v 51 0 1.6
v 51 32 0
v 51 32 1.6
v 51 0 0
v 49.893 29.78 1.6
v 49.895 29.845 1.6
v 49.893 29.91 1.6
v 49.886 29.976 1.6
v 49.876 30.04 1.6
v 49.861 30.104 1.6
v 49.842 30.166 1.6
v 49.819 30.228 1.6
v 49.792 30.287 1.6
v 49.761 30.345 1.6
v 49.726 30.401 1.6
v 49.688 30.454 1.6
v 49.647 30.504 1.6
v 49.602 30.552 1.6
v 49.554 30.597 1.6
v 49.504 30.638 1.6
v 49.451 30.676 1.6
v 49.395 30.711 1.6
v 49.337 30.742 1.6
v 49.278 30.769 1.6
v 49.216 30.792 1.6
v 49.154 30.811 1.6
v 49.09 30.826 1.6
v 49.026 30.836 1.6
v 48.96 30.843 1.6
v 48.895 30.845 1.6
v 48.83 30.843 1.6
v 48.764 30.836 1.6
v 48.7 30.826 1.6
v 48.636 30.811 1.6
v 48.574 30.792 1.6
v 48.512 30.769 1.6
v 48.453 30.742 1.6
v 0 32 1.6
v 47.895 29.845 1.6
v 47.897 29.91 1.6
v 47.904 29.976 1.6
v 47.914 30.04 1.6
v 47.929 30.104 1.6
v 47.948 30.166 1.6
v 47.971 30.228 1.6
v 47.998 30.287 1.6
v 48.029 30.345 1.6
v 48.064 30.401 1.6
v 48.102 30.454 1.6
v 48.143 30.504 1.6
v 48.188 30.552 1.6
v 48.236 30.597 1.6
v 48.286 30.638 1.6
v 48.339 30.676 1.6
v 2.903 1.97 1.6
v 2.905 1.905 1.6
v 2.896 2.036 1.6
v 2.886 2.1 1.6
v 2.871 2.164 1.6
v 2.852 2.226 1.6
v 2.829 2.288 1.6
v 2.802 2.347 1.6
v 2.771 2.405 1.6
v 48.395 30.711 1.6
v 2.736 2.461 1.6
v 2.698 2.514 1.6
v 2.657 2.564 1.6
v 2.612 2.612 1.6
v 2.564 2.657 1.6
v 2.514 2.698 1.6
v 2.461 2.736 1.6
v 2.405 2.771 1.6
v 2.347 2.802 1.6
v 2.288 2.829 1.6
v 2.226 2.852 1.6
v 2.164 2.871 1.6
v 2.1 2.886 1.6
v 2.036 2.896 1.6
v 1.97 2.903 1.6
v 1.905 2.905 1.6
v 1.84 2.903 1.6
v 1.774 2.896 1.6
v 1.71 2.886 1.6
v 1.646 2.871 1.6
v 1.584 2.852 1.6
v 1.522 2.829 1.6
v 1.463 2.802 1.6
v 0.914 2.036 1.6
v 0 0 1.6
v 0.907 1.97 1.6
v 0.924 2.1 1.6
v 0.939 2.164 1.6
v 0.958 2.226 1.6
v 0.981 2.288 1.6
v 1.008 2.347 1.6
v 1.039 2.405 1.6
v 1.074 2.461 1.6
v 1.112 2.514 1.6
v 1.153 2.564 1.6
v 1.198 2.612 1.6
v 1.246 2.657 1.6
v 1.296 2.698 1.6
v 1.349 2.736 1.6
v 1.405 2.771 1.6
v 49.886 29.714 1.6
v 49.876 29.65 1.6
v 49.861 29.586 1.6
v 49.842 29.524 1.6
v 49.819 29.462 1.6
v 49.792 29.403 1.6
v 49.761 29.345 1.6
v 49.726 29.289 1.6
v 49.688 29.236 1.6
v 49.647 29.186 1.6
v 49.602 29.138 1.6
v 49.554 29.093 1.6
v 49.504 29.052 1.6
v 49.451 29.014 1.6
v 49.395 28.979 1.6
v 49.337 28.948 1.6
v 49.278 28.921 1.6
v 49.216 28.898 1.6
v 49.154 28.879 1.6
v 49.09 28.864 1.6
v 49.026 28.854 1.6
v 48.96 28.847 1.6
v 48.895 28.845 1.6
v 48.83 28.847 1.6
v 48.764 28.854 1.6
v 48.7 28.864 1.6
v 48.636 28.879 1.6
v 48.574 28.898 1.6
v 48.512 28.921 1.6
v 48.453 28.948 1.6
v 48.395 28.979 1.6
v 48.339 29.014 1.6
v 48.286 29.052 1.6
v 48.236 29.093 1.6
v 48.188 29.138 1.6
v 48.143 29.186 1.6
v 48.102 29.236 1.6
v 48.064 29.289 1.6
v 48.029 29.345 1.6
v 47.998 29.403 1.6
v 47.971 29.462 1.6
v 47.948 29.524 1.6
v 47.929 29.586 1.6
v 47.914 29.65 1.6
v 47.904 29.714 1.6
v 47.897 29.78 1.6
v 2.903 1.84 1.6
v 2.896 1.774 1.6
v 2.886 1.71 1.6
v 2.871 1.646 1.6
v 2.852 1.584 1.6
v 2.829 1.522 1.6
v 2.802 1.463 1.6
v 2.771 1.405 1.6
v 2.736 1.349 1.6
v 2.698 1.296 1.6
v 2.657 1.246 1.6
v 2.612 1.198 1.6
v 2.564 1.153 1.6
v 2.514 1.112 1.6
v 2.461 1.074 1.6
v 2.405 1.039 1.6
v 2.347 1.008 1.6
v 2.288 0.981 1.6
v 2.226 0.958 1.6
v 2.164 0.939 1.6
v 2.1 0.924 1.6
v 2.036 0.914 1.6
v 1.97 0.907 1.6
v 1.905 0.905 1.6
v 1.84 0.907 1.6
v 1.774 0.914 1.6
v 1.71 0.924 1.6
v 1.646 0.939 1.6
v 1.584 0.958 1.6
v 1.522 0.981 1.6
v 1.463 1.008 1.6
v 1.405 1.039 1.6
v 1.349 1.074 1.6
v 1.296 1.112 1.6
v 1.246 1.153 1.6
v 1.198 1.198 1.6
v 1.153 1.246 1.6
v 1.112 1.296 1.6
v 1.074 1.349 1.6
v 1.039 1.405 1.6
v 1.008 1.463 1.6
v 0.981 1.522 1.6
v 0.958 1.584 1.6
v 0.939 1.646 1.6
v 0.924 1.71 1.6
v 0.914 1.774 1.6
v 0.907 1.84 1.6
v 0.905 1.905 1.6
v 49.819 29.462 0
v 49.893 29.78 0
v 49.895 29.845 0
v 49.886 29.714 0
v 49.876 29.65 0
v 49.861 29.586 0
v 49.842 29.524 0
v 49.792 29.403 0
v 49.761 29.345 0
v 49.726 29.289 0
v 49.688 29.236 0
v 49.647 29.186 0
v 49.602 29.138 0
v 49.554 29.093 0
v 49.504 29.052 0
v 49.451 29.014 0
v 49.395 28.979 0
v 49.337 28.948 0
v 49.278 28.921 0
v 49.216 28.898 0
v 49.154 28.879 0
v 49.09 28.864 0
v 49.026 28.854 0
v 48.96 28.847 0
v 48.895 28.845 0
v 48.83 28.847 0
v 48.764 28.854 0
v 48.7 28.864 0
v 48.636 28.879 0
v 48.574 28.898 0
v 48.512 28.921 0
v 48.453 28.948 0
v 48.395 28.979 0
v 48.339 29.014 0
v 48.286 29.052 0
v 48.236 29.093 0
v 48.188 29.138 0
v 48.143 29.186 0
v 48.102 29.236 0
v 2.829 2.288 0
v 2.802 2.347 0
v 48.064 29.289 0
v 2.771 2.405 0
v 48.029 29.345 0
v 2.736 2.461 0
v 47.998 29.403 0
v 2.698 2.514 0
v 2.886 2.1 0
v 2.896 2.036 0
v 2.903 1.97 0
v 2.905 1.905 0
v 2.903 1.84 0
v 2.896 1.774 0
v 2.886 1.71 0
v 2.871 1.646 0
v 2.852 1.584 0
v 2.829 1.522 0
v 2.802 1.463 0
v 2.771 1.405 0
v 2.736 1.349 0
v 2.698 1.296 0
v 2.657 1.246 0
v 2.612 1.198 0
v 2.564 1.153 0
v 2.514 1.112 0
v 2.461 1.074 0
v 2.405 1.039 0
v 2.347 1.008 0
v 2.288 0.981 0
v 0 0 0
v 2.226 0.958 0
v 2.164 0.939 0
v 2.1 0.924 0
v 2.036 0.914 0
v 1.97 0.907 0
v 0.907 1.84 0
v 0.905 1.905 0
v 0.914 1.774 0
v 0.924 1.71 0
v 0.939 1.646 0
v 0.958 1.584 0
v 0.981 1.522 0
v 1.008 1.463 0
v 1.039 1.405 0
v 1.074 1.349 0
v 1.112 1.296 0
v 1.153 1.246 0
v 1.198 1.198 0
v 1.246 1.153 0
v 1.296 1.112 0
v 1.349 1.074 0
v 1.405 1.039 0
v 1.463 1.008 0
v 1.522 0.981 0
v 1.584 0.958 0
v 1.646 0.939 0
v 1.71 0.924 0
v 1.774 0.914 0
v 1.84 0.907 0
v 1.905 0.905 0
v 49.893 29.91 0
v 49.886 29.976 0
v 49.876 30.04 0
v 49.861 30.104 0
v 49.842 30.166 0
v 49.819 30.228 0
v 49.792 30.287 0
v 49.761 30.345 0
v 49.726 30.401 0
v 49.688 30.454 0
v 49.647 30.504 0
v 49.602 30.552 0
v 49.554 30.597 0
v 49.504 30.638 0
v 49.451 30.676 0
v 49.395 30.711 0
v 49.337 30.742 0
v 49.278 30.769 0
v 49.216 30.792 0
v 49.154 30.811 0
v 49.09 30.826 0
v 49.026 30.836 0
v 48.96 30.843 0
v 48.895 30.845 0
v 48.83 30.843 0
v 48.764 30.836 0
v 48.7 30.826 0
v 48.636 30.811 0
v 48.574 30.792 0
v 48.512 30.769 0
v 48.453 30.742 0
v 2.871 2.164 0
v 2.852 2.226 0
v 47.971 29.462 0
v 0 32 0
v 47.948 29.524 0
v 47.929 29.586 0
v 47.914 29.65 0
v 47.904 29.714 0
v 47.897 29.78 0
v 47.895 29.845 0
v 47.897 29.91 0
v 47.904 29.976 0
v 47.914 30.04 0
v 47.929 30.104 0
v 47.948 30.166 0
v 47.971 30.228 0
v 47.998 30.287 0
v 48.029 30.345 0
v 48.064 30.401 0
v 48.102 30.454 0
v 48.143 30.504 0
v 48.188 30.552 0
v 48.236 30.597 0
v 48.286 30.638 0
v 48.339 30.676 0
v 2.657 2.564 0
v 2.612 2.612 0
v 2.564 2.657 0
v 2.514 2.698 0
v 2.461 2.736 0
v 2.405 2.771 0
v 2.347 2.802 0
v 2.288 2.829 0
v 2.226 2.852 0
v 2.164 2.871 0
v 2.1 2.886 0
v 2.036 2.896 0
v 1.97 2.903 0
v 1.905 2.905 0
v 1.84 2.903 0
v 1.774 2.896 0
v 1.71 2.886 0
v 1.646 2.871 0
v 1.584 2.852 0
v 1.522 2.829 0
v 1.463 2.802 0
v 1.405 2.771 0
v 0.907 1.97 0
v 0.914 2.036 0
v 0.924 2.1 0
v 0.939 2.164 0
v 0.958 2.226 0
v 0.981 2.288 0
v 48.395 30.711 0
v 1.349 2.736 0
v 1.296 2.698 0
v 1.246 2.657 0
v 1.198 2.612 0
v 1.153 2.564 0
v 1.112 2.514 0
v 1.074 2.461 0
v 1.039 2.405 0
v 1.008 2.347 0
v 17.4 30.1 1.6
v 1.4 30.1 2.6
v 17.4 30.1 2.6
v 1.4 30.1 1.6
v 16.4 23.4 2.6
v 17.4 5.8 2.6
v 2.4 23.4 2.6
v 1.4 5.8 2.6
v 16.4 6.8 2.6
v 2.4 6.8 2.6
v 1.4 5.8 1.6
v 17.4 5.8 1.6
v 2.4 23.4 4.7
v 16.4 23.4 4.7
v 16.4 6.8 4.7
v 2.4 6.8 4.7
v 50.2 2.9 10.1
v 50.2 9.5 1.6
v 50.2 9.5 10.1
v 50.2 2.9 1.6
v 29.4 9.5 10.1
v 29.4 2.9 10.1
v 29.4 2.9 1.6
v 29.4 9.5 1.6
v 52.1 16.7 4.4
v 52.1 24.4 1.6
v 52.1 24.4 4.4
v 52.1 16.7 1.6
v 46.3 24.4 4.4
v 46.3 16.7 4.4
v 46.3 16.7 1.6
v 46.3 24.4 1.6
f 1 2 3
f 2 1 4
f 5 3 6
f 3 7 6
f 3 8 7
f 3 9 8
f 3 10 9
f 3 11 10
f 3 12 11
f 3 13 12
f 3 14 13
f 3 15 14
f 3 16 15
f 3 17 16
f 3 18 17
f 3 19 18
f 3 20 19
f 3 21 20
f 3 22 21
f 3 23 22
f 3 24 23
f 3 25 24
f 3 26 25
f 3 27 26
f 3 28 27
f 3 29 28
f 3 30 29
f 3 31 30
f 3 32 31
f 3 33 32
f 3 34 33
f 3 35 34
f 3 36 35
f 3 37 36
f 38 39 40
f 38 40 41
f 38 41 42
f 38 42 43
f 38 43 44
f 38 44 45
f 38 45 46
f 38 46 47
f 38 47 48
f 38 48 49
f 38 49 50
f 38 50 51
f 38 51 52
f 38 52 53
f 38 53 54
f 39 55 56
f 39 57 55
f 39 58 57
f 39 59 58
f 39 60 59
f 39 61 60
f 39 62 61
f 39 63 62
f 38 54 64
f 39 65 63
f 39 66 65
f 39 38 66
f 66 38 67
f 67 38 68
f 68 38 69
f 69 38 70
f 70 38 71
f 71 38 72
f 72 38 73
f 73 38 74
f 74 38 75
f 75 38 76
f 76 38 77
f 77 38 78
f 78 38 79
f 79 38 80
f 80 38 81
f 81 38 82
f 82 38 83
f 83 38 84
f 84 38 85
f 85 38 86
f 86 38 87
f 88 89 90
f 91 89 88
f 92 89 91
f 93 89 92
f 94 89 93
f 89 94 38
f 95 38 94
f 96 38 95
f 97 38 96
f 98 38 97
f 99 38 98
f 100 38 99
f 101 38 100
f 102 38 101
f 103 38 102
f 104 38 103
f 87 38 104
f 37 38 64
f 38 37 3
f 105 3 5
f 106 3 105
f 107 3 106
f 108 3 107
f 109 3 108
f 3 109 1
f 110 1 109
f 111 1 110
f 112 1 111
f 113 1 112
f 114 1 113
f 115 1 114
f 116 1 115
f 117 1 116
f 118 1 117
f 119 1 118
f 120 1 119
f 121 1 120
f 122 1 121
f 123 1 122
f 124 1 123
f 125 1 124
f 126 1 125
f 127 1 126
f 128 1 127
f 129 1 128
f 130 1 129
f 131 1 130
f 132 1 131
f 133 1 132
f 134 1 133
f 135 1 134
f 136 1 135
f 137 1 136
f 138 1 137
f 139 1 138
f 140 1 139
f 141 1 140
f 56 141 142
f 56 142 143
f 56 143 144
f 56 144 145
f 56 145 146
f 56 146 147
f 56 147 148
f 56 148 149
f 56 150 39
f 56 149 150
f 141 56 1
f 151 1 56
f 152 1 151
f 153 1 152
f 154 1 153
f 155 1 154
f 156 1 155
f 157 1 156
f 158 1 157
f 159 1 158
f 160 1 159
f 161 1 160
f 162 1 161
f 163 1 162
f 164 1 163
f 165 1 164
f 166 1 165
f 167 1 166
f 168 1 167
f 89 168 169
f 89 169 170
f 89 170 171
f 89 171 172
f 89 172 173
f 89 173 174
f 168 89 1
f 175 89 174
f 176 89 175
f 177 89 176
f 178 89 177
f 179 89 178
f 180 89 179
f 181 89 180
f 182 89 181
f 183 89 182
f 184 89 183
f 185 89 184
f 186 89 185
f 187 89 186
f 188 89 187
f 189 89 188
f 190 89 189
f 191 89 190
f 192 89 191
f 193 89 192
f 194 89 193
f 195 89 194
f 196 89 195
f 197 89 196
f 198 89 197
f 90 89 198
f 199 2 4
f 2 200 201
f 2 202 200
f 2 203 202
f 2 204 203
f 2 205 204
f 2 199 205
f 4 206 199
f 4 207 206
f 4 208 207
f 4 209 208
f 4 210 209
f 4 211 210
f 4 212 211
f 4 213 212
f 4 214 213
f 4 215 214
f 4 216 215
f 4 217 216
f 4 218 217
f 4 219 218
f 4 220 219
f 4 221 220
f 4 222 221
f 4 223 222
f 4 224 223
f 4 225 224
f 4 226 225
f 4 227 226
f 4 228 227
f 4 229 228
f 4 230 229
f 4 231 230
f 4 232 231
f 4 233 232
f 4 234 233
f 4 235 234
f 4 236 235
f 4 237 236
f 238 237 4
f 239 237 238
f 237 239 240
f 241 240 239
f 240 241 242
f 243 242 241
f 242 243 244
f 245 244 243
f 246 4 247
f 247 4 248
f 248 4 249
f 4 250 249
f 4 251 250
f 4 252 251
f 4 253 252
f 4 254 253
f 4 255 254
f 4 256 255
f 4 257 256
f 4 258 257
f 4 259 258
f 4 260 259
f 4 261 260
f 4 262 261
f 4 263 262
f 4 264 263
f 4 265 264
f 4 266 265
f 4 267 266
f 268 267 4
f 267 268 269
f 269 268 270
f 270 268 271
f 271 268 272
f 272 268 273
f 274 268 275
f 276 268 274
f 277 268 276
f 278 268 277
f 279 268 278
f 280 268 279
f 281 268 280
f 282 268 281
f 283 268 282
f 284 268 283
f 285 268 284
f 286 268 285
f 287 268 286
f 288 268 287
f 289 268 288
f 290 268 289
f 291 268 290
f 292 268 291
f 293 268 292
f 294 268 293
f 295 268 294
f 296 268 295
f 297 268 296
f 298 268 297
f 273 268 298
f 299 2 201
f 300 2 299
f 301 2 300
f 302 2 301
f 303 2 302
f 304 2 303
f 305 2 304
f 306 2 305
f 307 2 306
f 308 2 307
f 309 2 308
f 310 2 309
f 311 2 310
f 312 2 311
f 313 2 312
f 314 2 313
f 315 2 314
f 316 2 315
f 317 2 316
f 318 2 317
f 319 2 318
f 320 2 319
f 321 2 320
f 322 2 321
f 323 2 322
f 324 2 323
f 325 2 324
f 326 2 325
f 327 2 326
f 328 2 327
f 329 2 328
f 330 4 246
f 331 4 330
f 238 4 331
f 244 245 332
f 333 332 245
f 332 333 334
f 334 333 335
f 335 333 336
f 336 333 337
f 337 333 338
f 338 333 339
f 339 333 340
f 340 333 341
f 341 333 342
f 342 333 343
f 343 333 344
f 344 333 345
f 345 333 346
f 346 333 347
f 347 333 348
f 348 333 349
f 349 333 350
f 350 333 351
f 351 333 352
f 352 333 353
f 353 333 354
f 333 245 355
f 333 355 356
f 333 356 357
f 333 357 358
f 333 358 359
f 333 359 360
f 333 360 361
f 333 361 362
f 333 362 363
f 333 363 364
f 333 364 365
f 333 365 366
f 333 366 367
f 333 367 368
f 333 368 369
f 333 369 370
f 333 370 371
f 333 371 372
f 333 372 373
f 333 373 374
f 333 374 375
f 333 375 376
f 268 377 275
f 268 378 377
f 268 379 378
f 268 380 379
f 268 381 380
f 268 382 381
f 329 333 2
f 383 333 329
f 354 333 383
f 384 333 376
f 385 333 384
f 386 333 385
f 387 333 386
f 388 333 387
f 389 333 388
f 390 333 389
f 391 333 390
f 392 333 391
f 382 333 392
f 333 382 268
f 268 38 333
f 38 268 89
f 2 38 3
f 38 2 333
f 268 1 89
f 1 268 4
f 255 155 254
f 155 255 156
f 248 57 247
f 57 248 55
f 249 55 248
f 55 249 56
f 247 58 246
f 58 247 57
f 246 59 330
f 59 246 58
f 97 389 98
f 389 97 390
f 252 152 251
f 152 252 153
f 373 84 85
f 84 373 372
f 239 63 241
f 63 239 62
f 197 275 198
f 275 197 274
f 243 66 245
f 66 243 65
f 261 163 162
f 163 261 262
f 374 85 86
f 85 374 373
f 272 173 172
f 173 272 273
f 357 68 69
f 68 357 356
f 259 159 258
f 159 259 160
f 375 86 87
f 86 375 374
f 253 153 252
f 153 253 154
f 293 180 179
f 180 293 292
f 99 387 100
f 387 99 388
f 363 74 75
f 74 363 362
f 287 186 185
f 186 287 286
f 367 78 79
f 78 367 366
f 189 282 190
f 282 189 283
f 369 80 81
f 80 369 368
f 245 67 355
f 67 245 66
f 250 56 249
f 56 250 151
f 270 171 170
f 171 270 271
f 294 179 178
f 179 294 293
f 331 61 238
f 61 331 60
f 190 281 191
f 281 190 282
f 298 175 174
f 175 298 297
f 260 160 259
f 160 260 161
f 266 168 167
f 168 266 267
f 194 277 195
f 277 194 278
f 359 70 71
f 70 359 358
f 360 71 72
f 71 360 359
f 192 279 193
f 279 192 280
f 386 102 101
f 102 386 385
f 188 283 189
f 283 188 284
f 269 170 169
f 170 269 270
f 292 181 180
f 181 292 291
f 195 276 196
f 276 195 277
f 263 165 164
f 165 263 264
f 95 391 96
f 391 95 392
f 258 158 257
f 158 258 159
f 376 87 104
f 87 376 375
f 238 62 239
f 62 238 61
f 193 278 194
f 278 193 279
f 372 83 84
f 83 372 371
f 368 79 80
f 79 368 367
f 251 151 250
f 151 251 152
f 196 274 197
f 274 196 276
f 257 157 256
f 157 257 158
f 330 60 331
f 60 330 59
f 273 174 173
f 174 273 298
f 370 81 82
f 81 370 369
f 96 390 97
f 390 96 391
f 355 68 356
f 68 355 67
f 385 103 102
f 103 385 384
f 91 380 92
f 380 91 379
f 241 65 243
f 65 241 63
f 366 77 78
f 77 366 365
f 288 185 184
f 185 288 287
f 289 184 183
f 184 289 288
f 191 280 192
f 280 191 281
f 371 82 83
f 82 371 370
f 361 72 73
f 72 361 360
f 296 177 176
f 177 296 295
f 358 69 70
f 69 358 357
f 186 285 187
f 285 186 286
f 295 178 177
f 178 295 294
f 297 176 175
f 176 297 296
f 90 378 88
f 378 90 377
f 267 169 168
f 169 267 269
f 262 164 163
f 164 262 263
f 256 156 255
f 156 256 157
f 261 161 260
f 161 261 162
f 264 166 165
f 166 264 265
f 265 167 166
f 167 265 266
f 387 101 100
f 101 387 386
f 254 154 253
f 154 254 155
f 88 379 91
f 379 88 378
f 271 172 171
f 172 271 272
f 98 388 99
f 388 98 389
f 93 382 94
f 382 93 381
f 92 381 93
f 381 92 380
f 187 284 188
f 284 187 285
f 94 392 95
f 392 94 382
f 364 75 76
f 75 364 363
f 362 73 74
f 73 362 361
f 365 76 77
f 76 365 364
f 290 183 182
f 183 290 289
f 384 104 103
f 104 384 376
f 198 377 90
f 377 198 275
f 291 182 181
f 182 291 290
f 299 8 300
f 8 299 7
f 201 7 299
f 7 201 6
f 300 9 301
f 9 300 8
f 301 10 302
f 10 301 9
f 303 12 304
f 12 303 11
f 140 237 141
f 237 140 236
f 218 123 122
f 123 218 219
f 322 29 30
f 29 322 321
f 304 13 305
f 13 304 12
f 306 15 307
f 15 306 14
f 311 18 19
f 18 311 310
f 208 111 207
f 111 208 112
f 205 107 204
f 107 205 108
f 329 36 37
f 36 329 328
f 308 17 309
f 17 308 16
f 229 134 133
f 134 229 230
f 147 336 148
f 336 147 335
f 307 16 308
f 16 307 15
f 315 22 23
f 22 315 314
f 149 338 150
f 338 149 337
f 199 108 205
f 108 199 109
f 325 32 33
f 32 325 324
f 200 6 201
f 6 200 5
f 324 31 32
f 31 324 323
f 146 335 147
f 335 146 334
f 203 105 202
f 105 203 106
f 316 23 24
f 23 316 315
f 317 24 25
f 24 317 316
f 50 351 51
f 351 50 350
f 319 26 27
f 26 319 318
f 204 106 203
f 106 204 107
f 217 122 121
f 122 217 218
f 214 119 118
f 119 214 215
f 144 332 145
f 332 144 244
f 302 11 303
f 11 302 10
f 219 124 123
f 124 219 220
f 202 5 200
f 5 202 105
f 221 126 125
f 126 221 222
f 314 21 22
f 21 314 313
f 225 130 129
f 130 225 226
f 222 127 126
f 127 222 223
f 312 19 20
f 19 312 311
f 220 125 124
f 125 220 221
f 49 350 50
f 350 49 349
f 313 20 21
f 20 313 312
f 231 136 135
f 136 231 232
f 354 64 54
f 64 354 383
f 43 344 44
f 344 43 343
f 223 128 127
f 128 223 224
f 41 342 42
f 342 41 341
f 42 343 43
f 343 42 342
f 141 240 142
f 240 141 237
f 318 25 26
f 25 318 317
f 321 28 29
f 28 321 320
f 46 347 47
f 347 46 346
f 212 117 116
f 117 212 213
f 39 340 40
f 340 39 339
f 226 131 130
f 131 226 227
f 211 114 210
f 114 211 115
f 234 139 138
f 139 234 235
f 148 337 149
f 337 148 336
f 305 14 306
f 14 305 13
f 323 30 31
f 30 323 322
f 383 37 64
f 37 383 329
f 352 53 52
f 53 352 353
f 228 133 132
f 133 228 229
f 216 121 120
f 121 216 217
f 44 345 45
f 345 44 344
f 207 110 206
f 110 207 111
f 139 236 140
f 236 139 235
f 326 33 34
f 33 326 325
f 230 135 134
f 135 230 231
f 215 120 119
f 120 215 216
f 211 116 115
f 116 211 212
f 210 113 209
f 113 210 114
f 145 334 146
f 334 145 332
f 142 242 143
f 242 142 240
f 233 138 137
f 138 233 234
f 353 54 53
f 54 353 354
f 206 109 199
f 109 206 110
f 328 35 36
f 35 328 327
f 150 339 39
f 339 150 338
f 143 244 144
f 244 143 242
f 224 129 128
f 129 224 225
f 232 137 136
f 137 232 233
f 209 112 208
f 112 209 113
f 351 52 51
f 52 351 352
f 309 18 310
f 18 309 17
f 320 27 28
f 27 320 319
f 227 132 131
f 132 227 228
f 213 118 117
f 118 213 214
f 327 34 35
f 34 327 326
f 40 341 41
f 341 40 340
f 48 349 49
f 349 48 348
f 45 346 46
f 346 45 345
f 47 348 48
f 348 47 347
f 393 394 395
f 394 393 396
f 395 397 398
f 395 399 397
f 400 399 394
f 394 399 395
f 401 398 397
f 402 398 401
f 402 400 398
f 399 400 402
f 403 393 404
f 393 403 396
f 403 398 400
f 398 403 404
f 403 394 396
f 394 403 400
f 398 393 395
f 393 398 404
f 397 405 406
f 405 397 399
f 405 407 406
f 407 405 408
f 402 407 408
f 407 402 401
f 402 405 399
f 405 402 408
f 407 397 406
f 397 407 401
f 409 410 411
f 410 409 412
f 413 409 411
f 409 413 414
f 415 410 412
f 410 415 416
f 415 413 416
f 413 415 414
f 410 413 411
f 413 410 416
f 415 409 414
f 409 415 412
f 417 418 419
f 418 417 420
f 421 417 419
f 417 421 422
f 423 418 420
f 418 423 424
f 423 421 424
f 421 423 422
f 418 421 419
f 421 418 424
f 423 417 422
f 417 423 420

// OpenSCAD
$fn=96;

HOLE_1_X = 1.905;
HOLE_1_Y = 1.905;
HOLE_2_X = 48.895;
HOLE_2_Y = 29.845;

BOARD_X = 51.0;
BOARD_Y = 32;
BOARD_HEIGHT = 1.6;


module pcb(){
    
    difference(){
        color([0.2,1.0,0.5])
        cube([BOARD_X, BOARD_Y, BOARD_HEIGHT]);
        
        translate([HOLE_1_X,HOLE_1_Y, 0])
        cylinder(r=1,h=5);
        
        translate([HOLE_2_X,HOLE_2_Y, 0])
        cylinder(r=1,h=5);
    }
}



module wifi(){
        
    // pcb
    color([0.3,0.3,0.3])
    cube([24.3, 16, 1.0]);
    
    // shield
    translate([1,1,1])
    cube([16.6, 14, 2.1]);
}

module screw_terminal(){
    
    color([0.1,1.0,0.7]) 
    cube([20.8, 6.6, 8.5]);
}

module usb(){
    
    cube([5.8, 7.7, 2.8]);
}


module board(){

    pcb();
    
    translate([0,0,1.6]){
        translate([17.4,5.8,0.0])
        rotate([0,0,90])
        wifi();
        
        translate([29.4,2.9,0.0])
        screw_terminal();
        
        translate([46.3,16.7,0.0])
        usb();
    }
}



board();
